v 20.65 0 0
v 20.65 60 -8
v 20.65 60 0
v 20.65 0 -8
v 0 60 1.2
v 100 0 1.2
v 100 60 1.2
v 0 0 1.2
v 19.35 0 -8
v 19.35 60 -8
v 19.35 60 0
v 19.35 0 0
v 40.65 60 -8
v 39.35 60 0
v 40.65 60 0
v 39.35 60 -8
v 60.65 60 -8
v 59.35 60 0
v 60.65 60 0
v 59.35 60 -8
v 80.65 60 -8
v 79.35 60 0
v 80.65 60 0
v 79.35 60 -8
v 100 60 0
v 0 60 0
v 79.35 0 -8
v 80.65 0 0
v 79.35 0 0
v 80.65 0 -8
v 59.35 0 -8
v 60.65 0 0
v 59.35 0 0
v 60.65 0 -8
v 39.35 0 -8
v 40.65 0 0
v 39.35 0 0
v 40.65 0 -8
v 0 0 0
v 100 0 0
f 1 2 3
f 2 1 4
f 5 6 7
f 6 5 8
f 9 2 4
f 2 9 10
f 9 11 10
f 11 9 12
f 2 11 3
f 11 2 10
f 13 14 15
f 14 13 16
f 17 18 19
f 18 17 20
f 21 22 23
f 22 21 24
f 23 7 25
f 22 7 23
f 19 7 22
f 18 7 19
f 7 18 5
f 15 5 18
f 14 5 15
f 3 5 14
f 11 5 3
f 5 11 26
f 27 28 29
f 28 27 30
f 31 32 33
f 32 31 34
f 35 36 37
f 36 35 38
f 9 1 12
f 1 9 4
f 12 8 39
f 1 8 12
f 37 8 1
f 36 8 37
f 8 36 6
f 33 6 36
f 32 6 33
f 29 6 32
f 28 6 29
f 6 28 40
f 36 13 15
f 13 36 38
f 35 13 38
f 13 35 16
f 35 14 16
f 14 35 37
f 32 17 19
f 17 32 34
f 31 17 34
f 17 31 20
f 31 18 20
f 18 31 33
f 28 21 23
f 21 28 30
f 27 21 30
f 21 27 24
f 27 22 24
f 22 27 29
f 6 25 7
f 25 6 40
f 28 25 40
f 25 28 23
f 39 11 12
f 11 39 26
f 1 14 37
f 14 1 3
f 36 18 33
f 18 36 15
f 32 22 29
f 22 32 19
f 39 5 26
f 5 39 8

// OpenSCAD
$fn = 32;

// ----------------------------------------------------------------------
// Ribbed panel: 1.2 mm panel
// ----------------------------------------------------------------------

// --- parameters (mm) ---
panel_l = 100;            // panel length, X
panel_w = 60;             // panel width, Y
panel_t = 1.2;            // panel thickness, Z
rib_t = 1.3;              // rib thickness
rib_h = 8;                // rib height below the panel
ribs = 4;                 // number of ribs

total_h = panel_t + rib_h;  // overall height

union() {
  cube([panel_l, panel_w, panel_t]);
  for (i = [1 : ribs])
    translate([i * panel_l / (ribs + 1) - rib_t / 2, 0, -rib_h])
      cube([rib_t, panel_w, rib_h + panel_t]);
}
